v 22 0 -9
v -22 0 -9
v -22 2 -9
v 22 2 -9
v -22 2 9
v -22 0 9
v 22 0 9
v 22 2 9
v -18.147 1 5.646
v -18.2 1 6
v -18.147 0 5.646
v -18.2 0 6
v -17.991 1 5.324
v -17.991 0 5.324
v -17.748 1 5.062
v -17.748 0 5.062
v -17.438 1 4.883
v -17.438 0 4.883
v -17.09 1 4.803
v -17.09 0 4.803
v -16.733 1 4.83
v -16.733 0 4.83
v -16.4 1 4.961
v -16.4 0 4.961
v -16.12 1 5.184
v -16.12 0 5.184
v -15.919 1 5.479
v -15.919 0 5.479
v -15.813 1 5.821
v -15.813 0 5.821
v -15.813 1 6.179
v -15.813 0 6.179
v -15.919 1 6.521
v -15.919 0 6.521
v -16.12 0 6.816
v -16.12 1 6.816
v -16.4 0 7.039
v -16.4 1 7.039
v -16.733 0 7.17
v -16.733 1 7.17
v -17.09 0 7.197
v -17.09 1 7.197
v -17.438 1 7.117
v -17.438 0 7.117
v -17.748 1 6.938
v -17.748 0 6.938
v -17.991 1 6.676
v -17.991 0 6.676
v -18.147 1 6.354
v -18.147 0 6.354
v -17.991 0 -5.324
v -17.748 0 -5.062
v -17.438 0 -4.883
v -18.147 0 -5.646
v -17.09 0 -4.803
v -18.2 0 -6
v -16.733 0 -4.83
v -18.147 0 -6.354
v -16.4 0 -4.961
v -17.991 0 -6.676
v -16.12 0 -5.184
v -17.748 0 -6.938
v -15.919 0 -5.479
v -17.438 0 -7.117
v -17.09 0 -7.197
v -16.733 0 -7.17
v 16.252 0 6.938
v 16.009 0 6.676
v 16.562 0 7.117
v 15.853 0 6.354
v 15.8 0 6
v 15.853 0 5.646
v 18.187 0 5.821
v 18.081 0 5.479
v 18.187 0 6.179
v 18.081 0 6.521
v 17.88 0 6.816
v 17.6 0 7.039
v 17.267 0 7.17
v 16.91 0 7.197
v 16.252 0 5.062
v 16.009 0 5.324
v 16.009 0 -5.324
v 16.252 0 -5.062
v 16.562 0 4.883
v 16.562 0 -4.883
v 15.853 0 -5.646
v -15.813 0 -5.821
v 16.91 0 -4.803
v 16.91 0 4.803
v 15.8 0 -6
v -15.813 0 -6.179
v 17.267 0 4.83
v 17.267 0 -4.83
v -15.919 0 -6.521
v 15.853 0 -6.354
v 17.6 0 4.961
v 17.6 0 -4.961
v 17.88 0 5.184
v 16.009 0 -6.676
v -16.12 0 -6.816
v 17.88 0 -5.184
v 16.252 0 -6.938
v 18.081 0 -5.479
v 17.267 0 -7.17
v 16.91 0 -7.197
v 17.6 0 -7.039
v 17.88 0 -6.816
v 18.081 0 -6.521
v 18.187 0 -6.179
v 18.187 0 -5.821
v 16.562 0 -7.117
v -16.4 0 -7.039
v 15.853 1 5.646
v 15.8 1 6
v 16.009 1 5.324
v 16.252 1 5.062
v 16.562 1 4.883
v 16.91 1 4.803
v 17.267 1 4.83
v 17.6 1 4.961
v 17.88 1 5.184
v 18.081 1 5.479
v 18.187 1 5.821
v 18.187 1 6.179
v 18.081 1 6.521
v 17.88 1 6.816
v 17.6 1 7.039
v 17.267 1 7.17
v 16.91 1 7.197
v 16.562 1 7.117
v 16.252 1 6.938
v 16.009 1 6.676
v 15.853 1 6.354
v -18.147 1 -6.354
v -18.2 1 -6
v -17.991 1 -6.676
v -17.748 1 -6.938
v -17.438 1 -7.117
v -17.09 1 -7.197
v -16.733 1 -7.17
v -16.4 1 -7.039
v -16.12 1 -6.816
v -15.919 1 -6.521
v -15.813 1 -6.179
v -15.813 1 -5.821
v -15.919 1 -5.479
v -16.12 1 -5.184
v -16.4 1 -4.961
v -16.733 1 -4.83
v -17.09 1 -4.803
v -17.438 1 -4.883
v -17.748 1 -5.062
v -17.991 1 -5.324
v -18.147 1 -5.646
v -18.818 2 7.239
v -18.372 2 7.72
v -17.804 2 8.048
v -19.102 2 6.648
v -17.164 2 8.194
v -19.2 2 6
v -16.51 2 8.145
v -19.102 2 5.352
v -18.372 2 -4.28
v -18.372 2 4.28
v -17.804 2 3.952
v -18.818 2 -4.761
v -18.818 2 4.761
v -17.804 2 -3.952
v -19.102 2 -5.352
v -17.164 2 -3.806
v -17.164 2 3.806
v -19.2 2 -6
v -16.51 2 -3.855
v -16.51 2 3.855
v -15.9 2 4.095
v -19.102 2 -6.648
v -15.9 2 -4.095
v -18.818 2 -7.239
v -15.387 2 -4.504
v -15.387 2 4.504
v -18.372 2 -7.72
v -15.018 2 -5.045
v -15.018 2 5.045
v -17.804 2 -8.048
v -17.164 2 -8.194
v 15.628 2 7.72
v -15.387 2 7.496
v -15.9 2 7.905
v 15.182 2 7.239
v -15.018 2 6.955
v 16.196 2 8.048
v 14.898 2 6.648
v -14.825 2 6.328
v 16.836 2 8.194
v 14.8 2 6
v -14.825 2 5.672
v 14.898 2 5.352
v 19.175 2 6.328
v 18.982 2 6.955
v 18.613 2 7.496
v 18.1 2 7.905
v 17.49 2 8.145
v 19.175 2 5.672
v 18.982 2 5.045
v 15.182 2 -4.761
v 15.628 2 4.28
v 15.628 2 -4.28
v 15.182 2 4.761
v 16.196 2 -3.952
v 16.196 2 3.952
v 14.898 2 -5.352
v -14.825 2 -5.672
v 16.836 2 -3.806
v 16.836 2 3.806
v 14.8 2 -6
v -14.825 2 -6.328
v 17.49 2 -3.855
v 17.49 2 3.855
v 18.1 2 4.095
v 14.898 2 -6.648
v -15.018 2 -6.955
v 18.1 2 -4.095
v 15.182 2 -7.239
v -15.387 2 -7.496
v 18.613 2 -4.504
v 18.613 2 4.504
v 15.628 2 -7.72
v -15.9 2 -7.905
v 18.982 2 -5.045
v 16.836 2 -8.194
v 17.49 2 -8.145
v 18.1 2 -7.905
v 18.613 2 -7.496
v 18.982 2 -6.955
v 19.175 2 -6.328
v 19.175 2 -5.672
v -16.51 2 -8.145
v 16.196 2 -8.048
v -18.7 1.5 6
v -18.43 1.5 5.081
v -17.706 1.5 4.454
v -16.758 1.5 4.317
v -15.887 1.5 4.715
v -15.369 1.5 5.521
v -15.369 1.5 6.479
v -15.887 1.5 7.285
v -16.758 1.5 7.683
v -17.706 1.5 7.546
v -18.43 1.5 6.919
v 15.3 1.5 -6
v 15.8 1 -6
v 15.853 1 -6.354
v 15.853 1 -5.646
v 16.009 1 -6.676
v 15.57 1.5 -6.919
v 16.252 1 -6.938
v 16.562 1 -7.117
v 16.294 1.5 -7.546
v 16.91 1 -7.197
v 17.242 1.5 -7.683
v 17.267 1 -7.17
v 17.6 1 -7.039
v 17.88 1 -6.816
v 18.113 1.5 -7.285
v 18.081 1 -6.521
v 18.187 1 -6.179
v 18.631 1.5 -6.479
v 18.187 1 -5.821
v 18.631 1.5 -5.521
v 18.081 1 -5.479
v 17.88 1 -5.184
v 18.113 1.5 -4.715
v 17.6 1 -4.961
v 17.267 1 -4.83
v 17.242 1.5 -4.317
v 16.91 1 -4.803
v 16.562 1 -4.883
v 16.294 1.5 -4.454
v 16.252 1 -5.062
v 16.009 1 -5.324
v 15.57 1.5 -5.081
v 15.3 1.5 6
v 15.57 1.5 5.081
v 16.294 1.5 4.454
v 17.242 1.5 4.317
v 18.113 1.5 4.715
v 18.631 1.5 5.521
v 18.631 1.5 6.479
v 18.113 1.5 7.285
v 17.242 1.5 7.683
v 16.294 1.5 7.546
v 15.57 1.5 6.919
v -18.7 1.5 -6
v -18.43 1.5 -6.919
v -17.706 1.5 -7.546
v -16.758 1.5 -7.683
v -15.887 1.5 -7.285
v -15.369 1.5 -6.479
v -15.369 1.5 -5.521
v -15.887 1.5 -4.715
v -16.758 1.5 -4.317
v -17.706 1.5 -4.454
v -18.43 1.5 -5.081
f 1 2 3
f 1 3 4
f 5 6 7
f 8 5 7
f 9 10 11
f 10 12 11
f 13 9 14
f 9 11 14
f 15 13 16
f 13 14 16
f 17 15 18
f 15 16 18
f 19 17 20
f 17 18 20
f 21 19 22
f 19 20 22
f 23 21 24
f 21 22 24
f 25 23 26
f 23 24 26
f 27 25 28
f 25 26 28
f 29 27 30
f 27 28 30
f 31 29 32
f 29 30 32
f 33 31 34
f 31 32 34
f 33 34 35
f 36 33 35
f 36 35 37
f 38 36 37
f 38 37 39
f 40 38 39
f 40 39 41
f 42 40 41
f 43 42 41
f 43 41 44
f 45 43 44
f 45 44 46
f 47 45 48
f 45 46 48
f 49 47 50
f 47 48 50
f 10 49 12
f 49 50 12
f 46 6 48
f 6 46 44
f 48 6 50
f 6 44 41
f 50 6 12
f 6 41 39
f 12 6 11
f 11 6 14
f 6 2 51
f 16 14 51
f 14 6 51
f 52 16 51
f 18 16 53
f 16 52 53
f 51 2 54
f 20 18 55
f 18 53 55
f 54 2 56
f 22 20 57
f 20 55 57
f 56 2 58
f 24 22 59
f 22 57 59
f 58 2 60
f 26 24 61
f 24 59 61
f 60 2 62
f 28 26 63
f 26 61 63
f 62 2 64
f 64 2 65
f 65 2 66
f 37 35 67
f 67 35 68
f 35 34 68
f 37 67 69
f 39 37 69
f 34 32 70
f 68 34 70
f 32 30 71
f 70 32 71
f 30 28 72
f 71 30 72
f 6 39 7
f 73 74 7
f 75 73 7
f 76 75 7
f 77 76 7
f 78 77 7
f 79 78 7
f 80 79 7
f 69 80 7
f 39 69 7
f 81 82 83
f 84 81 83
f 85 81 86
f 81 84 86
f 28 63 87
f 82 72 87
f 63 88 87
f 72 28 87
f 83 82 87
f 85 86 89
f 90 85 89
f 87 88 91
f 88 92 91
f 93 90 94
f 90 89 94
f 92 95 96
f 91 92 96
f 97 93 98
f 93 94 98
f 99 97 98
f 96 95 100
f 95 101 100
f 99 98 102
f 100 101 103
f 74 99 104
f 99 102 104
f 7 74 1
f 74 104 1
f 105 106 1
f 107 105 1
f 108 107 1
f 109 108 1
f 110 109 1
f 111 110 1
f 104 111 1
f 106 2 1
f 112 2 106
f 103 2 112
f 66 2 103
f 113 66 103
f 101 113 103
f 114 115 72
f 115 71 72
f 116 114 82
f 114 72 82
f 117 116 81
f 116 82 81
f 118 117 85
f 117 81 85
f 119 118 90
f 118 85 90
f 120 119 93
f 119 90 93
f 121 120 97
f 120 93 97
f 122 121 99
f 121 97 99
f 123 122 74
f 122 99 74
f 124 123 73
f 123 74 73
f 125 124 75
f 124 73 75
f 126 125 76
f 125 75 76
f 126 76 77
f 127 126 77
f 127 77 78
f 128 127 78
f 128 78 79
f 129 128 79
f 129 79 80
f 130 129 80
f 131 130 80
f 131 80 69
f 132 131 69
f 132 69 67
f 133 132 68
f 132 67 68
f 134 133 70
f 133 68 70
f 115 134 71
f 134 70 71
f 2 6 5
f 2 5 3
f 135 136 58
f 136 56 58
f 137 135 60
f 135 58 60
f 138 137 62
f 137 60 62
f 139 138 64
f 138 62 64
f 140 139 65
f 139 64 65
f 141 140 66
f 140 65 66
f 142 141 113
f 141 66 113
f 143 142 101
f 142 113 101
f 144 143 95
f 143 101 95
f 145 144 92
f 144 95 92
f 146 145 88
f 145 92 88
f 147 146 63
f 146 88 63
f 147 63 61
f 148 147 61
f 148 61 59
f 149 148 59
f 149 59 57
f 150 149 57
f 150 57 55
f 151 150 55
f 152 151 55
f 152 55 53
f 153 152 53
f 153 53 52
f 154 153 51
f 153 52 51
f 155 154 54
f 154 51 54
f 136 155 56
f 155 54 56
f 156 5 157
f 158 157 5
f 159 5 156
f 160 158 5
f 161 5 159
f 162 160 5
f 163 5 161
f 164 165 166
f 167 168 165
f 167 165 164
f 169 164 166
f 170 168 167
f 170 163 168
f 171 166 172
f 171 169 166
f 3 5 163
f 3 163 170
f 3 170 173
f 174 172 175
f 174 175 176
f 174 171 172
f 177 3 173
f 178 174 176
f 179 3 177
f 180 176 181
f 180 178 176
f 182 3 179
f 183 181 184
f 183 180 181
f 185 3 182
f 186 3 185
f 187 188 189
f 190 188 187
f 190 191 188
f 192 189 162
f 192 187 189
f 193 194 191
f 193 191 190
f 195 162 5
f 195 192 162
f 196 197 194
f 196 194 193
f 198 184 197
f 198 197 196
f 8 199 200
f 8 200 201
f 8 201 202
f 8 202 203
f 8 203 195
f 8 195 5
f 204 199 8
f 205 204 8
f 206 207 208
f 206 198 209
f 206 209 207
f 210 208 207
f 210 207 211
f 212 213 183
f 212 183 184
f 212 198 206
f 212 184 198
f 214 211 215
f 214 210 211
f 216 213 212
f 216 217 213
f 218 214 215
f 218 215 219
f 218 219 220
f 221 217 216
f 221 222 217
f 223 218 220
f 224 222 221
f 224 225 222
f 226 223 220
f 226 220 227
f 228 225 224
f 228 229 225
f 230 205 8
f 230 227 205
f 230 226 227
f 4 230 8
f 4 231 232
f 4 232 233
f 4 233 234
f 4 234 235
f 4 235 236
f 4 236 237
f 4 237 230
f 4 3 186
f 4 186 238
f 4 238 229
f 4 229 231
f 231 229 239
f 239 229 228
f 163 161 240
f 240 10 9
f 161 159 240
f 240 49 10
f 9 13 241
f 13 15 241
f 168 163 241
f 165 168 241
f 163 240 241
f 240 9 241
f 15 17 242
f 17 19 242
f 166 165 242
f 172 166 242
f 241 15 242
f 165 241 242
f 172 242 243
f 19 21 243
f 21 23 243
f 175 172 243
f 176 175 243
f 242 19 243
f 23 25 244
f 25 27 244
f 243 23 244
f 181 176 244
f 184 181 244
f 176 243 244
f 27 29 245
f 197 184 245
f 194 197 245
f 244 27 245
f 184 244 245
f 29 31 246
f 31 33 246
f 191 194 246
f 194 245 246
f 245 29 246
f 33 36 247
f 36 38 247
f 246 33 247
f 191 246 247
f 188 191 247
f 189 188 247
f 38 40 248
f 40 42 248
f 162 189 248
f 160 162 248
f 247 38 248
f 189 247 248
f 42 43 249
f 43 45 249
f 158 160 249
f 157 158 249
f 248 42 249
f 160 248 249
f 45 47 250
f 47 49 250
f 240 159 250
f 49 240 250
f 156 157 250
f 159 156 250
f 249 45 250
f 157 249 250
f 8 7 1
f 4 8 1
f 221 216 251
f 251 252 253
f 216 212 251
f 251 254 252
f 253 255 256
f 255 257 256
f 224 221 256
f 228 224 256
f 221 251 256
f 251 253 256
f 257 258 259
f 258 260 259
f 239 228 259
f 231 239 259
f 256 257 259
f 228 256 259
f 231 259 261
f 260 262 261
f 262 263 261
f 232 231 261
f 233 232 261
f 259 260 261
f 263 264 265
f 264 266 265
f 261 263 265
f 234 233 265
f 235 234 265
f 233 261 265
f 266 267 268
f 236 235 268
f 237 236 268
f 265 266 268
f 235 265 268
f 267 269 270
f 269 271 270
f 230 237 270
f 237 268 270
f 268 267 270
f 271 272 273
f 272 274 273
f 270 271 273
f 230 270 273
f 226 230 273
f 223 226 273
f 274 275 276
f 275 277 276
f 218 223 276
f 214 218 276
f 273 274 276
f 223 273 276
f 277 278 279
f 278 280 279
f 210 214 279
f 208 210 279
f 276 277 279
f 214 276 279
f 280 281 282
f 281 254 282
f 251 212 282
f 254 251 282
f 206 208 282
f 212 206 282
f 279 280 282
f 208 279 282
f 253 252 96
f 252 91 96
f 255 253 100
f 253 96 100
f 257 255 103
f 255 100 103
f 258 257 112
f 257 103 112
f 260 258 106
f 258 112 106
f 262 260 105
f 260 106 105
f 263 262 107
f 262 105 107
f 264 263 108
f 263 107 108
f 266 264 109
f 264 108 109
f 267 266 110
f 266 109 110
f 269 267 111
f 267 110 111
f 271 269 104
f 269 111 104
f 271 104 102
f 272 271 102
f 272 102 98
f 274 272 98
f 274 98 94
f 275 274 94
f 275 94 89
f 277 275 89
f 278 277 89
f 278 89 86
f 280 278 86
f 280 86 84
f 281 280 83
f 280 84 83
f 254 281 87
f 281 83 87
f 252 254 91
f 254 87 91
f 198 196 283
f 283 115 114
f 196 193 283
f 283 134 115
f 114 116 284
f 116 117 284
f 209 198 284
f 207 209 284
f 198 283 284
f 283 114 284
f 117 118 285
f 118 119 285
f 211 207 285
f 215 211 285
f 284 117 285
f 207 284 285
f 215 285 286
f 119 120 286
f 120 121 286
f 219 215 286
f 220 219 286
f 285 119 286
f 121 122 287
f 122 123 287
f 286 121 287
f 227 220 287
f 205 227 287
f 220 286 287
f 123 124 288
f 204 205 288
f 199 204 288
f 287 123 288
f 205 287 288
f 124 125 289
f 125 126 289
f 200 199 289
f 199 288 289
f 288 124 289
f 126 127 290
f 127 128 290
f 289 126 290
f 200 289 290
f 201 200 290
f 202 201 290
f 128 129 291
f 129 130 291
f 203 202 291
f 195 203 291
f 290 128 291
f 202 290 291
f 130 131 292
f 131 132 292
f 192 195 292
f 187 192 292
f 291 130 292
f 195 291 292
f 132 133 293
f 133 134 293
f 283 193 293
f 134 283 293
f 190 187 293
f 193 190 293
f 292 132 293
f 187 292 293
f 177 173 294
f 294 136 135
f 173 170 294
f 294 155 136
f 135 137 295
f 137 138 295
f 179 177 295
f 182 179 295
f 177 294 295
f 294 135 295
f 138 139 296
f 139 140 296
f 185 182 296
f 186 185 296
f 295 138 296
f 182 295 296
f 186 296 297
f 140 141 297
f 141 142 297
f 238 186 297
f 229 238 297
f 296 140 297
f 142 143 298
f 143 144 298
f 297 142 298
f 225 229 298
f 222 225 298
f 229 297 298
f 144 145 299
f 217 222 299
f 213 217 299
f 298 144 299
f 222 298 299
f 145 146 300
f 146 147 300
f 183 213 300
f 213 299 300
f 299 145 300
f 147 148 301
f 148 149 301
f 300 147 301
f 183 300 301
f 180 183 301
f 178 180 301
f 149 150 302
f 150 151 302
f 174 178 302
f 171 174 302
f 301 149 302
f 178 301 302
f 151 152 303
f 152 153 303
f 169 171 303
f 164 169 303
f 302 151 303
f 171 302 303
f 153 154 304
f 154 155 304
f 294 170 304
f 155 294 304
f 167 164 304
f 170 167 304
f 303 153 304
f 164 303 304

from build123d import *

# Parameters (mm, degrees)
SKETCH1_W                                       = 44
SKETCH1_H                                       = 18
BOSS_EXTRUDE1_DEPTH                             = 2
CSK_FOR_M2_FLAT_HEAD_MACHINE_SCREW1_D           = 2.4
CSK_FOR_M2_FLAT_HEAD_MACHINE_SCREW1_DEPTH       = 10
CSK_FOR_M2_FLAT_HEAD_MACHINE_SCREW1_CSINK_D     = 4.4
CSK_FOR_M2_FLAT_HEAD_MACHINE_SCREW1_CSINK_ANGLE = 90
CSK_FOR_M2_FLAT_HEAD_MACHINE_SCREW1_TIP         = 0.721032743


with BuildPart() as part:
    # Sketch1 → Boss-Extrude1 (new body)
    with BuildSketch(Plane(origin=(0, 0, 0), x_dir=(1, 0, 0), z_dir=(0, 1, 0))):
        Rectangle(SKETCH1_W, SKETCH1_H)
    extrude(amount=BOSS_EXTRUDE1_DEPTH)

    # CSK for M2 Flat Head Machine Screw1
    with Locations(Plane(origin=(0, 2, 0), x_dir=(1, 0, 0), z_dir=(0, 1, 0))):
        with Locations((-17, 6), (17, 6), (-17, -6), (17, -6)):
            CounterSinkHole(CSK_FOR_M2_FLAT_HEAD_MACHINE_SCREW1_D / 2, CSK_FOR_M2_FLAT_HEAD_MACHINE_SCREW1_CSINK_D / 2, depth=CSK_FOR_M2_FLAT_HEAD_MACHINE_SCREW1_DEPTH, counter_sink_angle=CSK_FOR_M2_FLAT_HEAD_MACHINE_SCREW1_CSINK_ANGLE)
            with Locations((0, 0, -(CSK_FOR_M2_FLAT_HEAD_MACHINE_SCREW1_DEPTH + CSK_FOR_M2_FLAT_HEAD_MACHINE_SCREW1_TIP / 2))):  # 118° drill point
                Cone(0, CSK_FOR_M2_FLAT_HEAD_MACHINE_SCREW1_D / 2, CSK_FOR_M2_FLAT_HEAD_MACHINE_SCREW1_TIP, mode=Mode.SUBTRACT)


solid = part.part
